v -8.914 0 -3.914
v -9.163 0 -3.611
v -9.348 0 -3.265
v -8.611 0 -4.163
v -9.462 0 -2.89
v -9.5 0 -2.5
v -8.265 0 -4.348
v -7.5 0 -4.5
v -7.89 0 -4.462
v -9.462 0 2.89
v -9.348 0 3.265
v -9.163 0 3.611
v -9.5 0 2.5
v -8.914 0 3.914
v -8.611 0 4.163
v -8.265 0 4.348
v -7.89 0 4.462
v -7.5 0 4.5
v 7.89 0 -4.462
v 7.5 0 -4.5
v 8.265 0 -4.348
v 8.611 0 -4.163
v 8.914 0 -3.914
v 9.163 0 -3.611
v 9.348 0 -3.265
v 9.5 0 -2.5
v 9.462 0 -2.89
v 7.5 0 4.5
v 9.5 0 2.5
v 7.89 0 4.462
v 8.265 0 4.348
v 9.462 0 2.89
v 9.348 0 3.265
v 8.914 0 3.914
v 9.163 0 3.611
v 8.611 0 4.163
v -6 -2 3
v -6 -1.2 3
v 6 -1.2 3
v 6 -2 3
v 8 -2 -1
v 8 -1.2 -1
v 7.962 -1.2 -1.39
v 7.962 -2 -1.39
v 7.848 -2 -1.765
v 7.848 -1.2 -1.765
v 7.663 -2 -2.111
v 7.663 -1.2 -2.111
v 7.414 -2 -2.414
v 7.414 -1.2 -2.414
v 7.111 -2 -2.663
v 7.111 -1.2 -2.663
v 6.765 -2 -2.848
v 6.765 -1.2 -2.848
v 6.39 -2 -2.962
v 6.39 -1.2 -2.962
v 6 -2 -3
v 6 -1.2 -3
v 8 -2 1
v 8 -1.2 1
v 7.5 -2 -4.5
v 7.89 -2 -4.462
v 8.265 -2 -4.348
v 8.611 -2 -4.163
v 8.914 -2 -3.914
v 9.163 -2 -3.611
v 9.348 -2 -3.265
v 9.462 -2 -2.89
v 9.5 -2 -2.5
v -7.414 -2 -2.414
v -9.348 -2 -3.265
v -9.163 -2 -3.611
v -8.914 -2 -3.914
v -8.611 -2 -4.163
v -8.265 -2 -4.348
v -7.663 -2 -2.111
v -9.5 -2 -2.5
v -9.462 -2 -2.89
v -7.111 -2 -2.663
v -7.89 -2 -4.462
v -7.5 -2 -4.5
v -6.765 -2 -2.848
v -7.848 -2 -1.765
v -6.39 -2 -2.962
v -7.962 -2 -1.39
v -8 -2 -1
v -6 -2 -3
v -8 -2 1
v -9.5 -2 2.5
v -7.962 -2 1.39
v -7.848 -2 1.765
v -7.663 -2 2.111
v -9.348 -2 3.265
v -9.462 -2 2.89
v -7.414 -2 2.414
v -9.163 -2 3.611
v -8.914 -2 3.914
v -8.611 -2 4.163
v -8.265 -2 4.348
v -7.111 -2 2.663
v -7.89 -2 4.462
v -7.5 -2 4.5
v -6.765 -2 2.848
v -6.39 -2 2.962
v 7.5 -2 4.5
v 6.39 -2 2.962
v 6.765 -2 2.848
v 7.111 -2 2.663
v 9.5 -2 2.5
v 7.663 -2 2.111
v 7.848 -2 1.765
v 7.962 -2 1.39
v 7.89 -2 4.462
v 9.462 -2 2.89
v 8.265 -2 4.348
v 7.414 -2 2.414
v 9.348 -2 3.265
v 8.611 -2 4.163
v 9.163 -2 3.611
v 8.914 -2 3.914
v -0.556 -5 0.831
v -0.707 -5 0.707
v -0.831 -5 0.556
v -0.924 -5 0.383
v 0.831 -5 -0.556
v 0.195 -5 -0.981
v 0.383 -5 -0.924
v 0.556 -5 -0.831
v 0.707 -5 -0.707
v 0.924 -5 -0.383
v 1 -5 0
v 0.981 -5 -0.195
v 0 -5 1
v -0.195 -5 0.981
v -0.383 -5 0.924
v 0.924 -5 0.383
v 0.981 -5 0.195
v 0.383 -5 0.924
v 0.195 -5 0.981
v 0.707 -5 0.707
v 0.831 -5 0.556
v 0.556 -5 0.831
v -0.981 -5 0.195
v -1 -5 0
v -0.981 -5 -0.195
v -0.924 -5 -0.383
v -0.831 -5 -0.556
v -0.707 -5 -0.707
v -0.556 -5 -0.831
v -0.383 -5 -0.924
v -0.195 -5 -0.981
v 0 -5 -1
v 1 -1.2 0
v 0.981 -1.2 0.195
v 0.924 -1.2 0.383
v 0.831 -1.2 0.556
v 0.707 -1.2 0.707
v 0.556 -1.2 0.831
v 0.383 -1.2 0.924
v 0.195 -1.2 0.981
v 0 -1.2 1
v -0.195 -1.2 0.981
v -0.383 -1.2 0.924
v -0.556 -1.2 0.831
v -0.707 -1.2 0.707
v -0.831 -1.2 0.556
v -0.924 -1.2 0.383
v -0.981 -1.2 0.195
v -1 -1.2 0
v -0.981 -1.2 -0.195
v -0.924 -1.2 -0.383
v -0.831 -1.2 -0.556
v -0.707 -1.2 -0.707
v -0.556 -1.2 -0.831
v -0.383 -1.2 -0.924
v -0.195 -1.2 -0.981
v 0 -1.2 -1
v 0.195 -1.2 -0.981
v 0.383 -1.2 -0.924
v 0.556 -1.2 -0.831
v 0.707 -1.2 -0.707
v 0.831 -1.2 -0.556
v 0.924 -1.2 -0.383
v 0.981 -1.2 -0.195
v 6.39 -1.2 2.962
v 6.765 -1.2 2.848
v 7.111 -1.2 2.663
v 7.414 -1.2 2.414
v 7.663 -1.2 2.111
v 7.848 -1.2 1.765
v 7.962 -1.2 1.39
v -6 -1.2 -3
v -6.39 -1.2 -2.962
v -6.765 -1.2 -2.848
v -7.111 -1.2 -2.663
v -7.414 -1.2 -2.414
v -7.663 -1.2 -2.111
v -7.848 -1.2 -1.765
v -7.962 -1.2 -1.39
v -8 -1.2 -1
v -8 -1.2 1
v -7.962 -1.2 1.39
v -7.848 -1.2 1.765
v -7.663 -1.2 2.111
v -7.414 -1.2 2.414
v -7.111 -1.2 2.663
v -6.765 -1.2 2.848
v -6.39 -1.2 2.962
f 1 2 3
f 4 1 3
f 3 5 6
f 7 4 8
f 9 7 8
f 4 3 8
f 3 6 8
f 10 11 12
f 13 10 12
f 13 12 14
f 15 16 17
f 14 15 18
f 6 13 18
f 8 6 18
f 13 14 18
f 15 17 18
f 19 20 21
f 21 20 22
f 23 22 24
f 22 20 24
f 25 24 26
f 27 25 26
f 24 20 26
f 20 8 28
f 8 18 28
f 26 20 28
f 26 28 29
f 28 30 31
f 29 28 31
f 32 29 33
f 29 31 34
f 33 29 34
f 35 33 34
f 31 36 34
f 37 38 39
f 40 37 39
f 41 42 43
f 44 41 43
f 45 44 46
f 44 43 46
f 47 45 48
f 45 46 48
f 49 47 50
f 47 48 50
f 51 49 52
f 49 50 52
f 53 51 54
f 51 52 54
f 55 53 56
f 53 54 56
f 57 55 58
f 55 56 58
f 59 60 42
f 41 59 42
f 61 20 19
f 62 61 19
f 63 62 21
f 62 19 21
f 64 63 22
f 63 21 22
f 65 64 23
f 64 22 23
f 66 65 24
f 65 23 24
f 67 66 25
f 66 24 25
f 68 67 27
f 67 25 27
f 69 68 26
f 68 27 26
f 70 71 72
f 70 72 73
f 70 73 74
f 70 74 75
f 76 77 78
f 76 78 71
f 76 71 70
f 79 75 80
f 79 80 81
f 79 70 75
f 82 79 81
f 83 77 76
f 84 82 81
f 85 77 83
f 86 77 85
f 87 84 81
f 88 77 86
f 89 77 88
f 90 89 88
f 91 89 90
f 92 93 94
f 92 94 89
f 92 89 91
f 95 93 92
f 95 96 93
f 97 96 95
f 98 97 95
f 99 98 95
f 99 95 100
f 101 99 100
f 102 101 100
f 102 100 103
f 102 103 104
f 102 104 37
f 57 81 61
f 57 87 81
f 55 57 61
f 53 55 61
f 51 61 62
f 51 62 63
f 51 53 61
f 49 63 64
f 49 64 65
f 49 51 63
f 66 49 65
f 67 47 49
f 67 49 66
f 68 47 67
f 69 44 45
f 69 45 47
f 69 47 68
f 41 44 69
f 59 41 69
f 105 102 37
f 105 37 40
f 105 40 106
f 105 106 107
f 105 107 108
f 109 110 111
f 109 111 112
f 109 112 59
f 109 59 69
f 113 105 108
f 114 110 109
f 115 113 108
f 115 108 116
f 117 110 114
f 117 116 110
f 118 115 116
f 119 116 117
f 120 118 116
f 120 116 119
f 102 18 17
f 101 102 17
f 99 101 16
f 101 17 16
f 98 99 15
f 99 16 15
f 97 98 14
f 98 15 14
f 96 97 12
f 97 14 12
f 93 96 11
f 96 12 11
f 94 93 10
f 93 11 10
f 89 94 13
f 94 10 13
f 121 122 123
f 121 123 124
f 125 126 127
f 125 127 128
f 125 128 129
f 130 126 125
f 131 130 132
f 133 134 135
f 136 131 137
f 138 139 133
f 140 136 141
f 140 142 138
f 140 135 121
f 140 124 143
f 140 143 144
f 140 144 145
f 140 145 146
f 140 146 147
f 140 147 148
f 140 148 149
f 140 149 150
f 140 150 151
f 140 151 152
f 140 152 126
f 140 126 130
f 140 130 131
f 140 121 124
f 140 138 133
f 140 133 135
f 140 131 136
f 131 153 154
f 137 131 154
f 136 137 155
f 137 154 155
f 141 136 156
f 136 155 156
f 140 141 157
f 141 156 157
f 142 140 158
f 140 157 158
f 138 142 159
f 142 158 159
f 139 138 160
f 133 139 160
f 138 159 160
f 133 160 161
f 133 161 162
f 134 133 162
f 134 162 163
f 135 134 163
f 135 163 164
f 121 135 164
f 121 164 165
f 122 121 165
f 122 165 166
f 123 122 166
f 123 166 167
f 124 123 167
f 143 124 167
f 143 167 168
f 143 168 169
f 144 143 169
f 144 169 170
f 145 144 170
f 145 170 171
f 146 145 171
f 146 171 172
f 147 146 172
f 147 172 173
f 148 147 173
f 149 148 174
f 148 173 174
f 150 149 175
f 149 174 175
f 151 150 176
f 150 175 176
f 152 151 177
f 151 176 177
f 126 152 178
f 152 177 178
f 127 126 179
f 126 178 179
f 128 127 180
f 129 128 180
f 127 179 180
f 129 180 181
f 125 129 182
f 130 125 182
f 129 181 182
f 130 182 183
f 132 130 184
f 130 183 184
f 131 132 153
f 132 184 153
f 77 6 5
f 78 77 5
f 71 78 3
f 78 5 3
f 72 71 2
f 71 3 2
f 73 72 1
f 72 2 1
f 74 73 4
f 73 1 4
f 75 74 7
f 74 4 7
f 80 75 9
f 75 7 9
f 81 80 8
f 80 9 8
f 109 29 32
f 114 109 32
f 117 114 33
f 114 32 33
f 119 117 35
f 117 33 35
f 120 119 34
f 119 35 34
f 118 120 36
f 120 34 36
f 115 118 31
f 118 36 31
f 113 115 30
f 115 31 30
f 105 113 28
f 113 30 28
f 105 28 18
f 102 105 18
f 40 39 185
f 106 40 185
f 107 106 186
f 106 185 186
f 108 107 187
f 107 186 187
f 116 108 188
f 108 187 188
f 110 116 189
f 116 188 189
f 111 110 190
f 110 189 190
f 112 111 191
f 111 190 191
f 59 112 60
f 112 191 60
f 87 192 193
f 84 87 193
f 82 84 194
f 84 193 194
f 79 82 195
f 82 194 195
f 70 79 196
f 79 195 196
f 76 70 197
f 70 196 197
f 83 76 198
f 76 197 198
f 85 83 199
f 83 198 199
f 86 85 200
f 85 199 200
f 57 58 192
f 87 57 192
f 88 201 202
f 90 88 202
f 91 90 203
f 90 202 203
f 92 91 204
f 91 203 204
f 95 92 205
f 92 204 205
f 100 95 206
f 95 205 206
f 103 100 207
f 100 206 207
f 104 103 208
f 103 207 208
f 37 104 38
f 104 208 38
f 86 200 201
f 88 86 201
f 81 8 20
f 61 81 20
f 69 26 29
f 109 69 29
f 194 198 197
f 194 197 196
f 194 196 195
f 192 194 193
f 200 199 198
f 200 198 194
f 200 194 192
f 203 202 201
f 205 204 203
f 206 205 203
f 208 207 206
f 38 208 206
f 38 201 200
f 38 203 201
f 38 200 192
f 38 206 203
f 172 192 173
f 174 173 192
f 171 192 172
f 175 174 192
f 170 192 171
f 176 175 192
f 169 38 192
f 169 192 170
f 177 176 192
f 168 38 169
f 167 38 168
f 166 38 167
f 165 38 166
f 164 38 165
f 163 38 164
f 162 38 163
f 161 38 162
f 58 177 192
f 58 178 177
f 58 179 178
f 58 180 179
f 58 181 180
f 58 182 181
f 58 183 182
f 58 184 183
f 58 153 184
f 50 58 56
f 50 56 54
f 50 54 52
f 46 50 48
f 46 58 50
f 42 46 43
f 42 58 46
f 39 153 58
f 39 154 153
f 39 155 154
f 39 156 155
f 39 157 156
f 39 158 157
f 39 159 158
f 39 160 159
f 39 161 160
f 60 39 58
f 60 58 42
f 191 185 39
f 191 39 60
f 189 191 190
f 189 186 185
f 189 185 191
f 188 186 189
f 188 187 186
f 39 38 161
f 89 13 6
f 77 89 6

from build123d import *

# Parameters (mm, degrees)
F1_DEPTH = 2
F0_R     = 1
F2_DEPTH = 1.2
F3_DEPTH = 5


with BuildPart() as f1:
    # F0 (on Front) → F1 (new body)
    with BuildSketch(Plane.XZ):
        with BuildLine():
            Line((-7.5, -4.5), (7.5, -4.5))
            ThreePointArc((7.5, -4.5), (8.914214, -3.914214), (9.5, -2.5))
            Line((9.5, -2.5), (9.5, 2.5))
            ThreePointArc((9.5, 2.5), (8.914214, 3.914214), (7.5, 4.5))
            Line((7.5, 4.5), (-7.5, 4.5))
            ThreePointArc((-7.5, 4.5), (-8.914214, 3.914214), (-9.5, 2.5))
            Line((-9.5, 2.5), (-9.5, -2.5))
            ThreePointArc((-9.5, -2.5), (-8.914214, -3.914214), (-7.5, -4.5))
        make_face()
        with BuildLine():
            ThreePointArc((8, -1), (7.414214, -2.414214), (6, -3))
            Line((6, -3), (-6, -3))
            ThreePointArc((-6, -3), (-7.414214, -2.414214), (-8, -1))
            Line((-8, -1), (-8, 1))
            ThreePointArc((-8, 1), (-7.414214, 2.414214), (-6, 3))
            Line((-6, 3), (6, 3))
            ThreePointArc((6, 3), (7.414214, 2.414214), (8, 1))
            Line((8, 1), (8, -1))
        make_face(mode=Mode.SUBTRACT)
    extrude(amount=F1_DEPTH)

    # F0 (on Front) → F2 (join)
    with BuildSketch(Plane.XZ):
        with BuildLine():
            Line((-6, -3), (6, -3))
            ThreePointArc((6, -3), (7.414214, -2.414214), (8, -1))
            Line((8, -1), (8, 1))
            ThreePointArc((8, 1), (7.414214, 2.414214), (6, 3))
            Line((6, 3), (-6, 3))
            ThreePointArc((-6, 3), (-7.414214, 2.414214), (-8, 1))
            Line((-8, 1), (-8, -1))
            ThreePointArc((-8, -1), (-7.414214, -2.414214), (-6, -3))
        make_face()
        Circle(F0_R, mode=Mode.SUBTRACT)
    extrude(amount=F2_DEPTH)

    # F0 (on Front) → F3 (join)
    with BuildSketch(Plane.XZ):
        Circle(F0_R)
    extrude(amount=F3_DEPTH)


solid = f1.part
